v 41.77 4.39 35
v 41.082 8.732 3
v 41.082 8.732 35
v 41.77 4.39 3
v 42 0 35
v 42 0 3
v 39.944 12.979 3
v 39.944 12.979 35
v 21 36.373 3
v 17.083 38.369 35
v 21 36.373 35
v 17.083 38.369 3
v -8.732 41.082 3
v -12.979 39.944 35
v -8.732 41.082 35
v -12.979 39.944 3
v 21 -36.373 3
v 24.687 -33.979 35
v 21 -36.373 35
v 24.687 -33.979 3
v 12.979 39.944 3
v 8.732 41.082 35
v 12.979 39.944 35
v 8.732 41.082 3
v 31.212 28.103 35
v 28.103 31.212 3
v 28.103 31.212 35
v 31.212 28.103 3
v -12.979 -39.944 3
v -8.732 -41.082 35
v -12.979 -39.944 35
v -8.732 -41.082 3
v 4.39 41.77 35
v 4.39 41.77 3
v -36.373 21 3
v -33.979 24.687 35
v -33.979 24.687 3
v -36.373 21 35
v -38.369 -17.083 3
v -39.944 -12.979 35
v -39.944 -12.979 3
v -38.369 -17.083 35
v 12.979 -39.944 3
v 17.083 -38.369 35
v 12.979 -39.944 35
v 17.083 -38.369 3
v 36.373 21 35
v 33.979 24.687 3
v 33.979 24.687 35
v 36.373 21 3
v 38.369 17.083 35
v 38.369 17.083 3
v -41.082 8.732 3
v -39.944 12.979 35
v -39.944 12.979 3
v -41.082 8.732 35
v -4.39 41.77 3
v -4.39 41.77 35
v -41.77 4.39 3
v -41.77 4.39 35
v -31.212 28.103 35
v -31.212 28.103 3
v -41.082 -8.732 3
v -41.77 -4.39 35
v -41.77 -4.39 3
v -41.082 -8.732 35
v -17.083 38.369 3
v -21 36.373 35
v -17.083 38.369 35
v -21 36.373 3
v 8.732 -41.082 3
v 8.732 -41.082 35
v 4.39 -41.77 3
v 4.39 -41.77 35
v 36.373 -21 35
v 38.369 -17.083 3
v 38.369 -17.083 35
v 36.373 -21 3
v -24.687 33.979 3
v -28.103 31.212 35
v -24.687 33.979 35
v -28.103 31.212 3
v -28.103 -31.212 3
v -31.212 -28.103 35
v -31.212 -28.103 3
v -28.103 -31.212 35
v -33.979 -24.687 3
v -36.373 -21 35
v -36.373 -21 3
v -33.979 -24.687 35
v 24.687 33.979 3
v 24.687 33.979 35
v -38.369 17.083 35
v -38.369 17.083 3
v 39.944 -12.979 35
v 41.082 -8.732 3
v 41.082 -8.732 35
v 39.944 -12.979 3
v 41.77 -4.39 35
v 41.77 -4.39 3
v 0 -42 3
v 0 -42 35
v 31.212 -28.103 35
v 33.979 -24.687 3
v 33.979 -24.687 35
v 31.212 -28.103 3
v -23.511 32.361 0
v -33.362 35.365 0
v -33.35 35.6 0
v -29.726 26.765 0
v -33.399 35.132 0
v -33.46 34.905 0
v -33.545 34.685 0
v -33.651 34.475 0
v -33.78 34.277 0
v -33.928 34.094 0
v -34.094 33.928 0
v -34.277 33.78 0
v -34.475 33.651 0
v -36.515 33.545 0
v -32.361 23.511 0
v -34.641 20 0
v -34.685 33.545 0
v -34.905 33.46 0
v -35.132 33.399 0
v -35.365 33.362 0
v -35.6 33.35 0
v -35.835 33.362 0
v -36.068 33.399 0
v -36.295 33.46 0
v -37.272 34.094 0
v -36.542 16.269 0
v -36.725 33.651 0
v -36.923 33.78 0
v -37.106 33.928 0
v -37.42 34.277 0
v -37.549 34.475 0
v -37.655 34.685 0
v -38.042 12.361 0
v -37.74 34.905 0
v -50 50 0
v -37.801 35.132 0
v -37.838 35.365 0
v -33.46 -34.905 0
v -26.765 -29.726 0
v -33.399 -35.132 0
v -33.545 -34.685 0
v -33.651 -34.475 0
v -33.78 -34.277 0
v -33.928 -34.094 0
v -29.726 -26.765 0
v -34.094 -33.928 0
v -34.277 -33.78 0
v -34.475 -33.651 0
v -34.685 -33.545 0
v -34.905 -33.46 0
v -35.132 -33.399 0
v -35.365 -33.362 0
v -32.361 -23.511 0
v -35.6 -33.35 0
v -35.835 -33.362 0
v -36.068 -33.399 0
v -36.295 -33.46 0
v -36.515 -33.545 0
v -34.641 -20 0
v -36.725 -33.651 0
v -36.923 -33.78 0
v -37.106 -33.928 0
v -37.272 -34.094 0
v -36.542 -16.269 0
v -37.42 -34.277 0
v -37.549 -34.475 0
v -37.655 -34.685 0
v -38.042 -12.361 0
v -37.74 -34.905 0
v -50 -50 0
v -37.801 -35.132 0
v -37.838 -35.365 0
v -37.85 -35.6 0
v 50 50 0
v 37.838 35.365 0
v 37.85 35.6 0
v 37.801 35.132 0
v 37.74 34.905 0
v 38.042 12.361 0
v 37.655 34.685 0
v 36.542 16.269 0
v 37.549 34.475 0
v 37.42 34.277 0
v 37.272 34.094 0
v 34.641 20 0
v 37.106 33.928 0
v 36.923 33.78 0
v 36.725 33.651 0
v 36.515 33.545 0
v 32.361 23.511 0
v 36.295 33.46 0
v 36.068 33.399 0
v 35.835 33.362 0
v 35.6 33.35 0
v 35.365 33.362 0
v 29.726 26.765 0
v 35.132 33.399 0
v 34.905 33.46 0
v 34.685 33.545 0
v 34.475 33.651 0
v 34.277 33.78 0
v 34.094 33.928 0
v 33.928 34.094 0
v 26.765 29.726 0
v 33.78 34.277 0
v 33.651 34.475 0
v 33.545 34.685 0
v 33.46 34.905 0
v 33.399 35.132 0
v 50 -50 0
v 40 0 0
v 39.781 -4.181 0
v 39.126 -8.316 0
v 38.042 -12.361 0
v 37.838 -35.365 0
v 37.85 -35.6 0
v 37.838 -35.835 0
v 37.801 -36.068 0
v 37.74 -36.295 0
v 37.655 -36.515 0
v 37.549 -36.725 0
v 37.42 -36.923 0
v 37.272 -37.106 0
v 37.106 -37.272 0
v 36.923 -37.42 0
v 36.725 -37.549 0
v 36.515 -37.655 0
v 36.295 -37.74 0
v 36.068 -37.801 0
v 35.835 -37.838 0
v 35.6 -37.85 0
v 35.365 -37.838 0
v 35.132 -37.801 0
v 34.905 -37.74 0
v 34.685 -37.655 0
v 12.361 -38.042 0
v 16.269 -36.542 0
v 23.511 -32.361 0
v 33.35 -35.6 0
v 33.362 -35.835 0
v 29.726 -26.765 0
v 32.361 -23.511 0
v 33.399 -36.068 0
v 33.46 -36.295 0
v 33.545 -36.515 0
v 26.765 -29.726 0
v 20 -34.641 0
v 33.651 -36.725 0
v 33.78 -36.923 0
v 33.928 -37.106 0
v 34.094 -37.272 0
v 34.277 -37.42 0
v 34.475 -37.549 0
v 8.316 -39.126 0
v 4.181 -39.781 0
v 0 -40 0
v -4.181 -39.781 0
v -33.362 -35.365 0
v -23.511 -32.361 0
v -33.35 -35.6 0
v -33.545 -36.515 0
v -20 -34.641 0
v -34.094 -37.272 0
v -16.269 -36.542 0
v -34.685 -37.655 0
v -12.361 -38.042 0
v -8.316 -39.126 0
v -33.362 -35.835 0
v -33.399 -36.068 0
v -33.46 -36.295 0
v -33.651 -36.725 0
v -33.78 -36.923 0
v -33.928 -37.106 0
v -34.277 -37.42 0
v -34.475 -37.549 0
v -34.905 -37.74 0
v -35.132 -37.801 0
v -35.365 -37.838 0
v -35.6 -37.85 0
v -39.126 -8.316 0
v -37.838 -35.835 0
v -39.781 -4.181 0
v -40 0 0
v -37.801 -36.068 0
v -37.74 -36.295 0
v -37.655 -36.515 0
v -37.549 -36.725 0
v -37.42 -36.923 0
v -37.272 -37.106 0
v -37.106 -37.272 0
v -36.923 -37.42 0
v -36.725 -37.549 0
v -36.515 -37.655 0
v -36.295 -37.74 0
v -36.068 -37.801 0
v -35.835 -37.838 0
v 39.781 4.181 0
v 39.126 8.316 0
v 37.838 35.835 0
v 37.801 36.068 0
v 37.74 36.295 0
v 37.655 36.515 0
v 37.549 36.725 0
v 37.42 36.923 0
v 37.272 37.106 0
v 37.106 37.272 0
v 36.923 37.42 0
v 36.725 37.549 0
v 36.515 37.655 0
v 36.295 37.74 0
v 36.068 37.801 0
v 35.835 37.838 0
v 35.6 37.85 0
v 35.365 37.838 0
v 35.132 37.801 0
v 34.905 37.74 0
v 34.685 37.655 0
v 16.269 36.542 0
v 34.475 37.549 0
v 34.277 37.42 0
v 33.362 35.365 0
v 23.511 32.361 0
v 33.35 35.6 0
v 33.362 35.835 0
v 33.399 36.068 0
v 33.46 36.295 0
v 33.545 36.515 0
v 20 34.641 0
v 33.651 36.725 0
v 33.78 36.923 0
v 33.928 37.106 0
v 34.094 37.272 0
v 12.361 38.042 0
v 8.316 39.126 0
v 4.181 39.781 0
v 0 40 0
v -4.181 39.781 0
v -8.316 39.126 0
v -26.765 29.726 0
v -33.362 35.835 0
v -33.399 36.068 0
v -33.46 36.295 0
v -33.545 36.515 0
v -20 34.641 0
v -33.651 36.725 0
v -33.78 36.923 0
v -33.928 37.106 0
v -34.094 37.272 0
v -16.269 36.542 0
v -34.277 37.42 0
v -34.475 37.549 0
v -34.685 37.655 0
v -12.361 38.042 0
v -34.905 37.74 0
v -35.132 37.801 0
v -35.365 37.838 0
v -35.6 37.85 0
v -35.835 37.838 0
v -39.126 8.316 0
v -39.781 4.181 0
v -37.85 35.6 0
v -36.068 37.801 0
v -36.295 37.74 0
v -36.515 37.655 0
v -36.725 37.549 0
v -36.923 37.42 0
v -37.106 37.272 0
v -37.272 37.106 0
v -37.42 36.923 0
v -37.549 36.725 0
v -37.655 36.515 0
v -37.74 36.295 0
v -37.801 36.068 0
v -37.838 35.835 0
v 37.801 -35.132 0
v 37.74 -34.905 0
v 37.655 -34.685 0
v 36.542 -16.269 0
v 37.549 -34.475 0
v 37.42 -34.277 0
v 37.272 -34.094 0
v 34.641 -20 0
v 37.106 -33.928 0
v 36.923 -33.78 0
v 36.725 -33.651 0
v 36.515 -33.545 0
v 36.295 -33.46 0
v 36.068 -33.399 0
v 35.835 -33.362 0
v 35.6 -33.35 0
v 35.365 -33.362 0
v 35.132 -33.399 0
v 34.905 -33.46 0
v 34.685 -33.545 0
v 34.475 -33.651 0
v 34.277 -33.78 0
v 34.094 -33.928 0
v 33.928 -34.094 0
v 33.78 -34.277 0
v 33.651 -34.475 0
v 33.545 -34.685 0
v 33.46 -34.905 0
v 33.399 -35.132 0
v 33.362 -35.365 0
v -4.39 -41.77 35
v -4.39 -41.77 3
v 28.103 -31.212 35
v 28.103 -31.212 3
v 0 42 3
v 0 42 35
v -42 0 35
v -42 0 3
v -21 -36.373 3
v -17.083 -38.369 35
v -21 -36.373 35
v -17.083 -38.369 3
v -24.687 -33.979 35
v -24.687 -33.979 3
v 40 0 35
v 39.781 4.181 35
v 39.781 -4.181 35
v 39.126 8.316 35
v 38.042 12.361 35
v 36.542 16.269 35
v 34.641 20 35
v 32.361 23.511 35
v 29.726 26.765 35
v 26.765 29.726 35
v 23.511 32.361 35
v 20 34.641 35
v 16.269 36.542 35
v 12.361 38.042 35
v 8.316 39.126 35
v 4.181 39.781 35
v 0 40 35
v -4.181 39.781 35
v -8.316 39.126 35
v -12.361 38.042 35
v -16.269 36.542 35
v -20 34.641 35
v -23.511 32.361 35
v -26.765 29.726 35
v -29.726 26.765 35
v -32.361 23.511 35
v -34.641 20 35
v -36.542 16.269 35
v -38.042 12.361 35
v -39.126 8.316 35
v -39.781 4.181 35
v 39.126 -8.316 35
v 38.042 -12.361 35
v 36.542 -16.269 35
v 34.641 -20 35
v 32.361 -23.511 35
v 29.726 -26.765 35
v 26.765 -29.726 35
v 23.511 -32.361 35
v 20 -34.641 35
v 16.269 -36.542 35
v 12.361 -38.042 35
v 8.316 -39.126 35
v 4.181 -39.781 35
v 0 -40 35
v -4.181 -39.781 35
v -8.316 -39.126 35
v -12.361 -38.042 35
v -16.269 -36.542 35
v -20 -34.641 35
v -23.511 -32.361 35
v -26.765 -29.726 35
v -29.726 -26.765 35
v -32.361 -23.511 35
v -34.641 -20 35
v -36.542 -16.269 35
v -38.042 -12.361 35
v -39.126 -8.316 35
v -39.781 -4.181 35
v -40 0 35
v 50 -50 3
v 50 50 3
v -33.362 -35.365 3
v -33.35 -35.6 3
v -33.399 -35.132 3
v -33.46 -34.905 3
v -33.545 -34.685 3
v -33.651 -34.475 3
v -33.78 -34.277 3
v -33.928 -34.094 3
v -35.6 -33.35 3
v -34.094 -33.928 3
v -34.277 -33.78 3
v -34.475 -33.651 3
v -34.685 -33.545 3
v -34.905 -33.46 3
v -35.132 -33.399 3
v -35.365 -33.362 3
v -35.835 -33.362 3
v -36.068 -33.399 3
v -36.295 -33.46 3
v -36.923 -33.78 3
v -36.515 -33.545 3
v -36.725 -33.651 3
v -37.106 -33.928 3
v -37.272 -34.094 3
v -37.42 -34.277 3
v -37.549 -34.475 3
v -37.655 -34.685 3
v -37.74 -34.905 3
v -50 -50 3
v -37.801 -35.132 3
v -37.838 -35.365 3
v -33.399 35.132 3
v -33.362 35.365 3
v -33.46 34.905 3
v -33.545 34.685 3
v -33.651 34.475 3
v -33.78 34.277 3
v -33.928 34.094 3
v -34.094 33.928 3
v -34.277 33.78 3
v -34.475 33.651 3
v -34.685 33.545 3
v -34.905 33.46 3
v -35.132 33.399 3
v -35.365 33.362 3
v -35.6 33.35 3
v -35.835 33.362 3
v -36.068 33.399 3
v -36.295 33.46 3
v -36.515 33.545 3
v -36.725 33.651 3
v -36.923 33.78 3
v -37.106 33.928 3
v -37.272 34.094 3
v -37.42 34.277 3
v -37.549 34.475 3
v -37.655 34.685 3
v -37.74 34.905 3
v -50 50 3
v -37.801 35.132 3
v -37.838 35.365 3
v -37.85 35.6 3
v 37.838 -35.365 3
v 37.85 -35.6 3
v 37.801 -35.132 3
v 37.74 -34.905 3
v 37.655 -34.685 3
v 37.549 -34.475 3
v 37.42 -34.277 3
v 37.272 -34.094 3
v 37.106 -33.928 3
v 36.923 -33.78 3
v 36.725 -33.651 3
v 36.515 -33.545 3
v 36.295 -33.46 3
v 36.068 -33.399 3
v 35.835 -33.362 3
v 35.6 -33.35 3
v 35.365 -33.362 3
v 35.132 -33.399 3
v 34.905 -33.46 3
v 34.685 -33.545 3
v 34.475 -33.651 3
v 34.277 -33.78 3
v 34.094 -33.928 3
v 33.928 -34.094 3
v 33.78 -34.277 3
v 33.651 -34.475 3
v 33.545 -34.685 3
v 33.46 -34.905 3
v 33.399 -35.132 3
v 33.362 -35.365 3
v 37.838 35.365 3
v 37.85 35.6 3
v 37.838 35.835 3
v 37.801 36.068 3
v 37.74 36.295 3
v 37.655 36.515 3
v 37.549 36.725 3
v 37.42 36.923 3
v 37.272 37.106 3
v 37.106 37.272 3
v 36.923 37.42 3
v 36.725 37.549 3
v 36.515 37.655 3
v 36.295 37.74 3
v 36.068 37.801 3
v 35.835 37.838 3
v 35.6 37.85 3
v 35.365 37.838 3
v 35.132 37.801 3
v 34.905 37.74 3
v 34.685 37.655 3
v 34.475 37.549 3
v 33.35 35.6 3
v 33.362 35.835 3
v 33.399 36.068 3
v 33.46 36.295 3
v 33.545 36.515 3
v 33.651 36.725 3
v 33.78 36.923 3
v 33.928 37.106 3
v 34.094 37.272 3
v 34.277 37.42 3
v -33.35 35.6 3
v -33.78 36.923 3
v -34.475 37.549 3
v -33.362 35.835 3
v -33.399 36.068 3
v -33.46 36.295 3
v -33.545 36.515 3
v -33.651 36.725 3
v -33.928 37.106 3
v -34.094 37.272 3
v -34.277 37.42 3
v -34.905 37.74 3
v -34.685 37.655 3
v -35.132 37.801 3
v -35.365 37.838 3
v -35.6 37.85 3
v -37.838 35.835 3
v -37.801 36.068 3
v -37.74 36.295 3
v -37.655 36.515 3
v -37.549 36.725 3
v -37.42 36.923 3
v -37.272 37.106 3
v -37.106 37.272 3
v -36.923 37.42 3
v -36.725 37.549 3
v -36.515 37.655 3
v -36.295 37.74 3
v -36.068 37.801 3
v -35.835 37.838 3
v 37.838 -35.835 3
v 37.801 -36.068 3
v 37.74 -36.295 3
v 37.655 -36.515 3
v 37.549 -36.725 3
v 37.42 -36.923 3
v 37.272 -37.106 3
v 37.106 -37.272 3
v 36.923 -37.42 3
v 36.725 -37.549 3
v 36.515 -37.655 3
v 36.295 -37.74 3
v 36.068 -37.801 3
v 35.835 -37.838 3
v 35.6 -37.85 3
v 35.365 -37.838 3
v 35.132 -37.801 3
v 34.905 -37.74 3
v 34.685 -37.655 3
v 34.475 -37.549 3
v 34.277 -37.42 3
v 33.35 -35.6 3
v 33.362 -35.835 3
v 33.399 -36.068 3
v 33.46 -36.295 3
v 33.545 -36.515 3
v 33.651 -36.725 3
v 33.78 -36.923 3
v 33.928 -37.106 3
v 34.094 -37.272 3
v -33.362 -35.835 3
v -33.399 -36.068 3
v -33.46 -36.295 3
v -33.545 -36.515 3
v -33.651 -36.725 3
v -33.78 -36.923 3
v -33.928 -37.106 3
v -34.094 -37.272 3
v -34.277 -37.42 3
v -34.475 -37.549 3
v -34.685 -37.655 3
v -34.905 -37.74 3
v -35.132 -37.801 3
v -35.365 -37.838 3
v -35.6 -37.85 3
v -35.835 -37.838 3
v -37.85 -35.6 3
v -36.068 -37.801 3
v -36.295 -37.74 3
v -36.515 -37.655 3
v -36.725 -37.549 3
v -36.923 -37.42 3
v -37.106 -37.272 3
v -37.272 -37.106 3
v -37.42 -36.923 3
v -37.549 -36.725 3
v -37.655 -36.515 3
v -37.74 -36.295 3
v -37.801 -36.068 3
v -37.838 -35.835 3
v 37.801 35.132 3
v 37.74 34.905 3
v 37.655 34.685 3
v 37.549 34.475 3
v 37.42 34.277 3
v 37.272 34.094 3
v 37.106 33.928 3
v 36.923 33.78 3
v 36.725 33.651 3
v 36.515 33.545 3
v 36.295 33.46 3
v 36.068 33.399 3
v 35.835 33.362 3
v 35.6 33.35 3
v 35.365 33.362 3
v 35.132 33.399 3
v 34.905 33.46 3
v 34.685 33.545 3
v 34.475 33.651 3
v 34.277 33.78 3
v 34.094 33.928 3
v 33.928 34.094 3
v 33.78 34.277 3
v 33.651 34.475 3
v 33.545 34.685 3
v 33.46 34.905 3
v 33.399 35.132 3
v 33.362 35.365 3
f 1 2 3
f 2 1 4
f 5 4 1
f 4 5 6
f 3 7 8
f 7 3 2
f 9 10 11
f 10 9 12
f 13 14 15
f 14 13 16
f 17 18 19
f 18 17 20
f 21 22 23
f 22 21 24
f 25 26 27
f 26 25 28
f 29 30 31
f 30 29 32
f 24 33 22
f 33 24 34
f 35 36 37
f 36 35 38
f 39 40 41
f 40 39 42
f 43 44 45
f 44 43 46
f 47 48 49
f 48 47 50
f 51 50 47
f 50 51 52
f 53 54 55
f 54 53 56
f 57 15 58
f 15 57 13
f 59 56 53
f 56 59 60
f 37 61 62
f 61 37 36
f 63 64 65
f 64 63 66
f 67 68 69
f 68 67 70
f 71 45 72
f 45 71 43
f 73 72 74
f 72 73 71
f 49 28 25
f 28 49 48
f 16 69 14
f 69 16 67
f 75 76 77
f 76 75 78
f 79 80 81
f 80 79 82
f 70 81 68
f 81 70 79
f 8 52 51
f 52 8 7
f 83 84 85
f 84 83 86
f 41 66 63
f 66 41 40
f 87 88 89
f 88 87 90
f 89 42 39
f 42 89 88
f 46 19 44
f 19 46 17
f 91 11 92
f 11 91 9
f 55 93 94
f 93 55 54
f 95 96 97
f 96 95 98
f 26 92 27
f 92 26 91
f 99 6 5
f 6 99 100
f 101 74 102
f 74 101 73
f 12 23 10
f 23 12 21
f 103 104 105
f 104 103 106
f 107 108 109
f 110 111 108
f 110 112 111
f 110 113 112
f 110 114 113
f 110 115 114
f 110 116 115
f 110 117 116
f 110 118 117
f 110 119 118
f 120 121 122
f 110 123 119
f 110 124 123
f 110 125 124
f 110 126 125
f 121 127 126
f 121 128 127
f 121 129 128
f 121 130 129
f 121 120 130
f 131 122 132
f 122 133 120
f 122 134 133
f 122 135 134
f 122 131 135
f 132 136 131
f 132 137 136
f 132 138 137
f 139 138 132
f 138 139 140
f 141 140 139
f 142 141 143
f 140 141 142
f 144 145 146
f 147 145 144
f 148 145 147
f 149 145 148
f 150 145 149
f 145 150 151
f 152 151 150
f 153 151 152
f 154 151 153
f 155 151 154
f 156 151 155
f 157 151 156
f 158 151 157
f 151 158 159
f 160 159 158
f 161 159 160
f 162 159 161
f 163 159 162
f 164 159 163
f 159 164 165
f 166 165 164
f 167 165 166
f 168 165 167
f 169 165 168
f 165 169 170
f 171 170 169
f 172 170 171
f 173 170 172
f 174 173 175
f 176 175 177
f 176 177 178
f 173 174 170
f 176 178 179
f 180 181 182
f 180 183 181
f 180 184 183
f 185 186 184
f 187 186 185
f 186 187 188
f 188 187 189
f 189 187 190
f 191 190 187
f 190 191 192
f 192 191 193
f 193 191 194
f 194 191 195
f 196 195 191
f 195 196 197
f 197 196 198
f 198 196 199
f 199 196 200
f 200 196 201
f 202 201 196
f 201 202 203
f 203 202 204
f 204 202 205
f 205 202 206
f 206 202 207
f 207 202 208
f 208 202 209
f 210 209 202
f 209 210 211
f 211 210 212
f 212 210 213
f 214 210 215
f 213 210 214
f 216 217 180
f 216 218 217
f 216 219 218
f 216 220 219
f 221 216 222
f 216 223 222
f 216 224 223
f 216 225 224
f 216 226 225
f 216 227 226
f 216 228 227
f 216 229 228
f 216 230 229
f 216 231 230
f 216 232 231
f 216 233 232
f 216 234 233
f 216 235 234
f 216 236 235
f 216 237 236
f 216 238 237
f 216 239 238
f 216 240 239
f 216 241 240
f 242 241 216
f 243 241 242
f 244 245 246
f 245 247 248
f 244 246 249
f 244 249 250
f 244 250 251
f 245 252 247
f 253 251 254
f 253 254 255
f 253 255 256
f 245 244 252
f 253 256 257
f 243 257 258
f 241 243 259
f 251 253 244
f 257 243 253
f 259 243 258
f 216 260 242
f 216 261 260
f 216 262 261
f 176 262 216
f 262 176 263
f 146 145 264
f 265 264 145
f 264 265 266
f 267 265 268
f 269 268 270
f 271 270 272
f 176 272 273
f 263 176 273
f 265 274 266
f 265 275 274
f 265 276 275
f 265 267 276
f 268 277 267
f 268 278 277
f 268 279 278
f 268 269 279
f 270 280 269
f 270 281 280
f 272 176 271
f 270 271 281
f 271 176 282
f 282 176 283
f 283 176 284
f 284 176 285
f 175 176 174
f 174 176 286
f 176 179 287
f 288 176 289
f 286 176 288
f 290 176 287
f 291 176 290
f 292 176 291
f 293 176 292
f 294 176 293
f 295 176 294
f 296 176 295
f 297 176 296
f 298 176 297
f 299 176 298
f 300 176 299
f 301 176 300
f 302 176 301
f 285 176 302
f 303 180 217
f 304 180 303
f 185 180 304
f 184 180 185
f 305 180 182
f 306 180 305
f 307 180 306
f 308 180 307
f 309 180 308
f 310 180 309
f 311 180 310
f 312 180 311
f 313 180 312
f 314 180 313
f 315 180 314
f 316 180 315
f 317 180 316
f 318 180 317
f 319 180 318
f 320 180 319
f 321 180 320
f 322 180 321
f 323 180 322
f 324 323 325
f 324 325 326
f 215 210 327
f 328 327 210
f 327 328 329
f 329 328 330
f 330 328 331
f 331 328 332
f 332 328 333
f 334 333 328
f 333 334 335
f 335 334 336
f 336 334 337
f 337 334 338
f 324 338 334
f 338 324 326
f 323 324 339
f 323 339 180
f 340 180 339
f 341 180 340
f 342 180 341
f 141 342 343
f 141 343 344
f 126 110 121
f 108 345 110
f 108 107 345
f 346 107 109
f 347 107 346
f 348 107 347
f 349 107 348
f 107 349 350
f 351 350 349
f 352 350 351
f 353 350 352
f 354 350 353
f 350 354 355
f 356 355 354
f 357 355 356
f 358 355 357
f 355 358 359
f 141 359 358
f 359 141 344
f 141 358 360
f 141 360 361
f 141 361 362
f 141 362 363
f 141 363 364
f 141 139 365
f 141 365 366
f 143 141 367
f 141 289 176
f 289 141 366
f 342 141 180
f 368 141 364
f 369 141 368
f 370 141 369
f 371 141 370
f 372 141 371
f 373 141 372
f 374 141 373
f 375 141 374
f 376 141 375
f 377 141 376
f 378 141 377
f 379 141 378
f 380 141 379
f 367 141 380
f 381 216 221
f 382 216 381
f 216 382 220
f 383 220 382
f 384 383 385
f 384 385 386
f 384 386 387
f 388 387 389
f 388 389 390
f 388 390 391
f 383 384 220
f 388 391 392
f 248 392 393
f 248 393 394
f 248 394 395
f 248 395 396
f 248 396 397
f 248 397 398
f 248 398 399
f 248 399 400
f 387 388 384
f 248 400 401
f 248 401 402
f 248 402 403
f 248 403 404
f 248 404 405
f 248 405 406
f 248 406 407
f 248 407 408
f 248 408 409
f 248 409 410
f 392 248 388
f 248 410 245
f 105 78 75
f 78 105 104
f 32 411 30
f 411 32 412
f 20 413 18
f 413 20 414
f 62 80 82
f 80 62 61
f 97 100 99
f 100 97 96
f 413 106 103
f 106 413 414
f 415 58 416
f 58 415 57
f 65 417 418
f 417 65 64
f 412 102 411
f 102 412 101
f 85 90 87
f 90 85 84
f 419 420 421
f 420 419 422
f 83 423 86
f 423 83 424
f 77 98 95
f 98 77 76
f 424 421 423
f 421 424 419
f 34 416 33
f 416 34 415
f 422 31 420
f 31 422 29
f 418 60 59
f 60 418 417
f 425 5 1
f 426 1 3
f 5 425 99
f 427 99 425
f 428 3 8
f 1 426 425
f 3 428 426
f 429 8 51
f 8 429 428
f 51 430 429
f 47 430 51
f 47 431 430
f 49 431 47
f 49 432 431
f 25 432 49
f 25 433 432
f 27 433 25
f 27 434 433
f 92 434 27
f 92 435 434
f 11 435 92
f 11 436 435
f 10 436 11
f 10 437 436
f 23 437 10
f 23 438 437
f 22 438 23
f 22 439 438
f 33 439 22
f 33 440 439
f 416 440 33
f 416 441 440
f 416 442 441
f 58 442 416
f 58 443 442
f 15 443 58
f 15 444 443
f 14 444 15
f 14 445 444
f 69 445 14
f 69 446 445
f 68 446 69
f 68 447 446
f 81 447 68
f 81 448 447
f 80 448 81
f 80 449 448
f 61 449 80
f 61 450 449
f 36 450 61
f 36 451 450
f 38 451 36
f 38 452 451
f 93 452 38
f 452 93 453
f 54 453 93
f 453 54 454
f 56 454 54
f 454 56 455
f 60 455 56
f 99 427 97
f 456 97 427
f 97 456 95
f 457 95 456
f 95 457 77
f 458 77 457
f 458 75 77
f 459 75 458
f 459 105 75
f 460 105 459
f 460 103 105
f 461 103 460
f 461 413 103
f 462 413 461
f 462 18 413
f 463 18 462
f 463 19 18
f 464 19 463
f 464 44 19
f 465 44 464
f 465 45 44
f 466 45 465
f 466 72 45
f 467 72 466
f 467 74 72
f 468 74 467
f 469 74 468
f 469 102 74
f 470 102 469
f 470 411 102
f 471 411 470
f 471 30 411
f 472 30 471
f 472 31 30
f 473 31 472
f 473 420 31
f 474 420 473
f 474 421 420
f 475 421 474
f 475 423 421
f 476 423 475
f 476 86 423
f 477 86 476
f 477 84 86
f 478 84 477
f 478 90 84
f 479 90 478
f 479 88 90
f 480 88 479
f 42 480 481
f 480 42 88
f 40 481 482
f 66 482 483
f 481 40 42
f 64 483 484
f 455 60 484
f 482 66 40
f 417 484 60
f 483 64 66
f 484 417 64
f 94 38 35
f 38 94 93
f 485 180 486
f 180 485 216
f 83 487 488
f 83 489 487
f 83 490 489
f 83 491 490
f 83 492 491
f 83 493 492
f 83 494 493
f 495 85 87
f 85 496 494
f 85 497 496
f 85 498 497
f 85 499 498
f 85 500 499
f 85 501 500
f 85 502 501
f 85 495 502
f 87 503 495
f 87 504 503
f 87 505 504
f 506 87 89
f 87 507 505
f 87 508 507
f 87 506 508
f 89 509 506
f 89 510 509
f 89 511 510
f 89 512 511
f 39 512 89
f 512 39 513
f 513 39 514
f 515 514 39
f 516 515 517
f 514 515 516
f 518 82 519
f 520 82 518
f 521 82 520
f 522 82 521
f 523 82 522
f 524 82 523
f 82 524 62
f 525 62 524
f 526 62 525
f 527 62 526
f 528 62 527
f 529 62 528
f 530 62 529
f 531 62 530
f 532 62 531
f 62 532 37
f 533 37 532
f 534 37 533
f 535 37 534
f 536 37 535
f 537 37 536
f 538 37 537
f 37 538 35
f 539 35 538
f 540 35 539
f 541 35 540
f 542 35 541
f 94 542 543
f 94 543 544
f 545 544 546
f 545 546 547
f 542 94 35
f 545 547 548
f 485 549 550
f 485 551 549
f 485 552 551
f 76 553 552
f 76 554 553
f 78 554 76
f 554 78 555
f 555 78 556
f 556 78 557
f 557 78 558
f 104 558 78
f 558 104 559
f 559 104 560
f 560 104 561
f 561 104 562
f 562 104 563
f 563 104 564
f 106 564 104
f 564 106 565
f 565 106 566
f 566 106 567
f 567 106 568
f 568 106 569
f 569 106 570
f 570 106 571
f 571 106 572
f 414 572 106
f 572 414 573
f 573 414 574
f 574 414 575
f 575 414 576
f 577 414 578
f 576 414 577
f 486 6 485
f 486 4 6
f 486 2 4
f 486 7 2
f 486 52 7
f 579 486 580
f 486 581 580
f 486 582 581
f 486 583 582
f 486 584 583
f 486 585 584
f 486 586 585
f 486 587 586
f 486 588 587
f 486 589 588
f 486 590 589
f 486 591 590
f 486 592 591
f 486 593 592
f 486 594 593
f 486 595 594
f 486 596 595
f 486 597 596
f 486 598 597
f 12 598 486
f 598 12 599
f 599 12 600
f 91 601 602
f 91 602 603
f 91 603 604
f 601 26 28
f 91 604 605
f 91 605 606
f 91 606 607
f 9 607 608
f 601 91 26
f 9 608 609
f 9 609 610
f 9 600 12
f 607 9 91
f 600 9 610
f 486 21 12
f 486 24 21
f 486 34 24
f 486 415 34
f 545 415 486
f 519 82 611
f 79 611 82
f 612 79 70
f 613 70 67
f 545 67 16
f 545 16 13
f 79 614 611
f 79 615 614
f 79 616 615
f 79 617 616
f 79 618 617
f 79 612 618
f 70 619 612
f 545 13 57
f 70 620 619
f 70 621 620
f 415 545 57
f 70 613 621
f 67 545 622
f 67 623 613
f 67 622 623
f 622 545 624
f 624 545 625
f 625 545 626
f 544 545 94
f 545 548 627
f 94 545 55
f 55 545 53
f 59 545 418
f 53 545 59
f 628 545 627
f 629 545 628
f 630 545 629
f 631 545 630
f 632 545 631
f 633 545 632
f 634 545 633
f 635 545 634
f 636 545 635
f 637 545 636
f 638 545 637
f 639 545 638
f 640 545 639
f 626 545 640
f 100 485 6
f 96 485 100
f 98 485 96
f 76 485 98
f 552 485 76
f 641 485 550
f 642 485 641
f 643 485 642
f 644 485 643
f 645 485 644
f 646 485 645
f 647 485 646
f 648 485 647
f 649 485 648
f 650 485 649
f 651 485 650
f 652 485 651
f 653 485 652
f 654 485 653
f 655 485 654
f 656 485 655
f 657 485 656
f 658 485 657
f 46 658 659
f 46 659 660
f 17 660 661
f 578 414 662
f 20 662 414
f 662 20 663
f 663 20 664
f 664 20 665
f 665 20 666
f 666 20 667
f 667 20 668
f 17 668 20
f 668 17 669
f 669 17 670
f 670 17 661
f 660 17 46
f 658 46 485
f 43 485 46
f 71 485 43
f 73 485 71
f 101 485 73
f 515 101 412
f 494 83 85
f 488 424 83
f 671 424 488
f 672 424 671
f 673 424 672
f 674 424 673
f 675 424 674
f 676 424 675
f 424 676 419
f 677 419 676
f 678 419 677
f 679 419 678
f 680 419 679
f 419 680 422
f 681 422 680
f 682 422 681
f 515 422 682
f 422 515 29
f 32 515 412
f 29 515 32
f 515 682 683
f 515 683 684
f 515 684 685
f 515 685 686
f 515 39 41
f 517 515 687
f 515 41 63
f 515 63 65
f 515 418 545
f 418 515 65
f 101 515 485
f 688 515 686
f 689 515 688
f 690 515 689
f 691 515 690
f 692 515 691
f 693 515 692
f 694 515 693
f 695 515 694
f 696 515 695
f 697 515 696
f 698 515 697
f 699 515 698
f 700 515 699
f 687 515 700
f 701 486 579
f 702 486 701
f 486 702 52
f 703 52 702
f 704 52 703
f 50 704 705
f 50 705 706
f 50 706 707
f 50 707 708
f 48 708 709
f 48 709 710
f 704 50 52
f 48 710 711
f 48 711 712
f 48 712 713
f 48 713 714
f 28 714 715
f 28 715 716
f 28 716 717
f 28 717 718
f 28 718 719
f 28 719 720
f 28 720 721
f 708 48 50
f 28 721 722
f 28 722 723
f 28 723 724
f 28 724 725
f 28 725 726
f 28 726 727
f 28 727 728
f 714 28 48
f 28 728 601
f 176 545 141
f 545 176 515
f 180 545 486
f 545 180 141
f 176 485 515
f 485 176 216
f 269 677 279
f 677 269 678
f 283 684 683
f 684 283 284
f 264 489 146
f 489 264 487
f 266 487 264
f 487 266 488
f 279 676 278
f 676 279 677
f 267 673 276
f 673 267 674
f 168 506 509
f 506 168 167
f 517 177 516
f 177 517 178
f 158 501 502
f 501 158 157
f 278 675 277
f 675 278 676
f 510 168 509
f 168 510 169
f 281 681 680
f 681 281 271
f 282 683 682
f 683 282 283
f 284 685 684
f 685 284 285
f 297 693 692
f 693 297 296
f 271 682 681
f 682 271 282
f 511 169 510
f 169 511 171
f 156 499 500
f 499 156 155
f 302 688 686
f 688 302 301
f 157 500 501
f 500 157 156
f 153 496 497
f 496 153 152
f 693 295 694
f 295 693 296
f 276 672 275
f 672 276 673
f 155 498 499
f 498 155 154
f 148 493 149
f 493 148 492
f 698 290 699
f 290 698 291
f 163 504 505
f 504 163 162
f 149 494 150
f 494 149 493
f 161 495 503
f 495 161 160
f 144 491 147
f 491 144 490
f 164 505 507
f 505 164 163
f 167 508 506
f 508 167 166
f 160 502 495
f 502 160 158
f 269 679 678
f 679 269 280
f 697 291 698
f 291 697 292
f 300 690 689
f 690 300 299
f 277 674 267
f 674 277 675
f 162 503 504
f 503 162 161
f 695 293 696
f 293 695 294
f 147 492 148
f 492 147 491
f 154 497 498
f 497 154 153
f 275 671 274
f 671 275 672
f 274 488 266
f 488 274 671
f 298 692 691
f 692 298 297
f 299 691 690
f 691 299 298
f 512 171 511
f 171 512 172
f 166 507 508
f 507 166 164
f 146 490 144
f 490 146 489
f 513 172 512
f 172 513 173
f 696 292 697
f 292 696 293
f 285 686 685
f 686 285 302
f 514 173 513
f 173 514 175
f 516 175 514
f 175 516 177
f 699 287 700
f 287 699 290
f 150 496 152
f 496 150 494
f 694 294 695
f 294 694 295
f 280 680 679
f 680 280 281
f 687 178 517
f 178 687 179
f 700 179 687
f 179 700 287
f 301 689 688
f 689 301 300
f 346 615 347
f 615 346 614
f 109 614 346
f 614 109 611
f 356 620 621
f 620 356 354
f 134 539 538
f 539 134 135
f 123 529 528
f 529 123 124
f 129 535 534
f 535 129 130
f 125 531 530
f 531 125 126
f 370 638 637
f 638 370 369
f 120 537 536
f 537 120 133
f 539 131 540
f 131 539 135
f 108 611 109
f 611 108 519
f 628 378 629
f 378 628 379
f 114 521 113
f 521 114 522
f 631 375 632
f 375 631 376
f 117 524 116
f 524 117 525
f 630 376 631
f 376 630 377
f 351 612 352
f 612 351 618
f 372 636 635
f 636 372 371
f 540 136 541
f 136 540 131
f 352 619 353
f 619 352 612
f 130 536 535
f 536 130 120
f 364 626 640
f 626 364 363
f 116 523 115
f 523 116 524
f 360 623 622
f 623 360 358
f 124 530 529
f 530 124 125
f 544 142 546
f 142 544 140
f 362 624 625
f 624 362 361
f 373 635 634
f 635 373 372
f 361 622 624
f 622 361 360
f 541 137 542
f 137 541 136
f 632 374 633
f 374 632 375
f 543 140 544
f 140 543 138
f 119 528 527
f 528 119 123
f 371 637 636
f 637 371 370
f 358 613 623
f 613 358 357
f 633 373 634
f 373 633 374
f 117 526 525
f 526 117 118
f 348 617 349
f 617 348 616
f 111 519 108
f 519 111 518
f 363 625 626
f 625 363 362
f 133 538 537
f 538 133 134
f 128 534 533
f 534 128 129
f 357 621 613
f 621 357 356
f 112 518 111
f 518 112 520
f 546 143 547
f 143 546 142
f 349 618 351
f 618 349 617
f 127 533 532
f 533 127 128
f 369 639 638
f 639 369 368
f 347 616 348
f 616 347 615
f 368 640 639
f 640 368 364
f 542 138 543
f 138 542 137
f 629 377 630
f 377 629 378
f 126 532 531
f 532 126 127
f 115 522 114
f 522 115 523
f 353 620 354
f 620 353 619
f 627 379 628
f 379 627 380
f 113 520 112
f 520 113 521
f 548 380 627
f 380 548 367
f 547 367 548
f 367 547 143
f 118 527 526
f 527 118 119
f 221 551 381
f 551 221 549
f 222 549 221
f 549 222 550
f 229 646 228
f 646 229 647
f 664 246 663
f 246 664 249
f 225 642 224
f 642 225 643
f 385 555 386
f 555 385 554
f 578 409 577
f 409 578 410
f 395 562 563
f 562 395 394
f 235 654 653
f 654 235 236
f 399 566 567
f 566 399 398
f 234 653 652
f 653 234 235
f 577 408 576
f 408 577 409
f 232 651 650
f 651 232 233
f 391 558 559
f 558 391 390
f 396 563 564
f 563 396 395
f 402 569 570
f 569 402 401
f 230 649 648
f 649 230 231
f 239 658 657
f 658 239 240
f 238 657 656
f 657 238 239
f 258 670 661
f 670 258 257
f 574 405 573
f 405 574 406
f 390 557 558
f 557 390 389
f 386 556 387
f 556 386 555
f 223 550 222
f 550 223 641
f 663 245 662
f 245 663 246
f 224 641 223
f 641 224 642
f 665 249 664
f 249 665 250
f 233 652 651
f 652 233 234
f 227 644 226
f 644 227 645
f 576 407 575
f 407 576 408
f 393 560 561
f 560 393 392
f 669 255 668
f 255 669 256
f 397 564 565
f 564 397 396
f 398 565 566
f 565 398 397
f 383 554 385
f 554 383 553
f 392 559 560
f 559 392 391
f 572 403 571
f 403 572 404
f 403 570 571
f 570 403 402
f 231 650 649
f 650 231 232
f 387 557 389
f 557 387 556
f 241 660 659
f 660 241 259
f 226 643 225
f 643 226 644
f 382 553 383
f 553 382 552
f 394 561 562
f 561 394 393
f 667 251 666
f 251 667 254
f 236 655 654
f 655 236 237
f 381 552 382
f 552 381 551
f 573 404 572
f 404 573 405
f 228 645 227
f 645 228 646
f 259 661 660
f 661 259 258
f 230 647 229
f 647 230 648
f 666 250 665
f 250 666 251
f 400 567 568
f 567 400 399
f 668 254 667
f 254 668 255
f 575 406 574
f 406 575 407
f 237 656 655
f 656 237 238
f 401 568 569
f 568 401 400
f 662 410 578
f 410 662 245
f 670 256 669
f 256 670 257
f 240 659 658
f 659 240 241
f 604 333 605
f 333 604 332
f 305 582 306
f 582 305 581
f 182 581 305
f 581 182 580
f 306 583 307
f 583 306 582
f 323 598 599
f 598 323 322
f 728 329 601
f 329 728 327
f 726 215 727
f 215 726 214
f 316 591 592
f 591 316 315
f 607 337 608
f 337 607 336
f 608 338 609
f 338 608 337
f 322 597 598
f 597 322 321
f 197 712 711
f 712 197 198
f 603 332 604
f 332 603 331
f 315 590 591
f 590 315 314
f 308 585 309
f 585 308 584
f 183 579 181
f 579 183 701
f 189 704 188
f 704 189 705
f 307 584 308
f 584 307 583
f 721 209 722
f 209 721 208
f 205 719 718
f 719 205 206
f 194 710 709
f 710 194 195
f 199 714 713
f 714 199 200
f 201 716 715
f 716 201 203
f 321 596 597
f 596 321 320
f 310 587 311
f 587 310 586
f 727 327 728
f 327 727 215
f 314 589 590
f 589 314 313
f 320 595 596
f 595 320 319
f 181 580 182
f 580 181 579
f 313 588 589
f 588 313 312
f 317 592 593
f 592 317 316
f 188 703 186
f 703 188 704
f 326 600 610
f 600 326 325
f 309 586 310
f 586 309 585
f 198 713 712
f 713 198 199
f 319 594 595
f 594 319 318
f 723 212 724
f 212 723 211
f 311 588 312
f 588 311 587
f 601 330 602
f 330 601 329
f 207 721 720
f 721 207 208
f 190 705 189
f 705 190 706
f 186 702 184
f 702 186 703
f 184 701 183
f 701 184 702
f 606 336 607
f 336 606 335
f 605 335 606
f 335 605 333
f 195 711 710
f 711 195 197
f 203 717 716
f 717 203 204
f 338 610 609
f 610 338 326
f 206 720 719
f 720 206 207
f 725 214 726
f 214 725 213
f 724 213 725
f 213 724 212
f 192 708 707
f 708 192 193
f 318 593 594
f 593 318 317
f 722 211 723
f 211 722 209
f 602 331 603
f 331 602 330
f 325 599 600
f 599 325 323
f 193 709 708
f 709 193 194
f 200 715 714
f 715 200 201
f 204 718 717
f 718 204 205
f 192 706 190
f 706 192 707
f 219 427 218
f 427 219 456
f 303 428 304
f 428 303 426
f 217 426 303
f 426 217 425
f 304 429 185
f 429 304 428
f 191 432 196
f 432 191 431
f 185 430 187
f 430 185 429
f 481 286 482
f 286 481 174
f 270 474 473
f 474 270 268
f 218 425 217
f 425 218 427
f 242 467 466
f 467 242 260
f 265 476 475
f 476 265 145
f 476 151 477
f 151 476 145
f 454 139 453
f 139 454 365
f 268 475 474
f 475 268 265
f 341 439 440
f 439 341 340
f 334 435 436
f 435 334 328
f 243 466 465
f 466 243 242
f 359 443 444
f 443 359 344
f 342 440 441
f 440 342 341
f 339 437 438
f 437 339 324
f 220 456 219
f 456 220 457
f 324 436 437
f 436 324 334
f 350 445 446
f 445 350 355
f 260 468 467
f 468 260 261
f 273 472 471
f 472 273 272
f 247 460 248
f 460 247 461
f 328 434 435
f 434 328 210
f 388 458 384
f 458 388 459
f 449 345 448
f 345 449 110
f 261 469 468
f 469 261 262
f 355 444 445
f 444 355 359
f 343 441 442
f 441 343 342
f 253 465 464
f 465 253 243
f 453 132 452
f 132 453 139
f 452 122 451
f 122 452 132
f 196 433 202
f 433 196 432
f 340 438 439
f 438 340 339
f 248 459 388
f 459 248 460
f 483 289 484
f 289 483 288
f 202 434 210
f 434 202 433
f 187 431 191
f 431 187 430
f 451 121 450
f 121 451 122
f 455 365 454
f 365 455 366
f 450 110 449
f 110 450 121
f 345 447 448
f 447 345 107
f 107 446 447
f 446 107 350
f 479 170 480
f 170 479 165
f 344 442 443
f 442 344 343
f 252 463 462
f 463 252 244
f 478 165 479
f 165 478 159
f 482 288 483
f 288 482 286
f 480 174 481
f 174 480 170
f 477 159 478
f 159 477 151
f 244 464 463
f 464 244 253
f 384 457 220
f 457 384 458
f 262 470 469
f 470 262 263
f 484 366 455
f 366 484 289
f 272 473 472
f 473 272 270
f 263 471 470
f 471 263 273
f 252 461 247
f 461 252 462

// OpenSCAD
$fn=60;

// hose_radius = 84/2;
// hose_depth = 25;
// thickness = 3;

// flange_width = 120;
// flange_length = 120;
// flange_depth = 3;

// flange_offset_x = 15;
// flange_offset_y = 15;

// fan_mount_hole_distance=67;
// fan_mount_hole_diameter = 4.5;

// flange_hole_diameter = 4.5;


hose_radius = 84/2;
hose_depth = 35;
thickness = 2;

flange_width = 100;
flange_length = 100;
flange_depth = 3;

flange_offset_x = 0;
flange_offset_y = 0;


fan_holes = 0;
fan_mount_hole_distance=71.2 / 2;
fan_mount_hole_diameter = 4.5;

flange_hole_diameter = 4.5;
flange_hole_distance = (flange_width - 20) /2;

flange(1, 0, 0, flange_width, flange_length, flange_depth, hose_radius, hose_depth);

//translate([120,0,0])
//translate([120,0,0])
//flange(0, 1, 1, flange_width + 15, flange_length + 15, flange_depth +1, hose_radius, 25.4/2, hose_radius-thickness -.5, hose_depth+25);

//color("blue")
//translate([120,100,0])
//insert(hose_radius, hose_depth+25);

module insert(hose_radius, hose_depth)
{
	difference()
	{
		cylinder(r=hose_radius, h=hose_depth);
		translate([0,0,-1])
			cylinder(r=hose_radius-thickness, h=hose_depth+2);
	}
}

module lines(gw)
{
	for(i = [-flange_length / gw / 2:(flange_length / gw / 2)])
	{
		translate([-flange_width/2,	i * gw,0])
			cube([flange_width,gw /3,2]);
	}
}


module flange(fan_holes, mount_holes, grid, flange_width, flange_length, flange_depth, hose_radius, hose_depth, hose_radius2, hose_depth2)
{
	gw = 6;
	if (grid == 1)
	{
		difference()
		{
			union()
			{
				rotate([0,0,90])lines(gw);
				lines(gw);
			}
			if (mount_holes == 1)
			{
				translate([-flange_hole_distance, -flange_hole_distance, -1])
					flange_mount();
				translate([-flange_hole_distance, flange_hole_distance, -1])
					flange_mount();
				translate([flange_hole_distance, -flange_hole_distance, -1])
					flange_mount();
				translate([flange_hole_distance, flange_hole_distance, -1])
					flange_mount();		
			}
		}
	}
	
	difference()
	{
		union()
		{
			cylinder(r=hose_radius, h=hose_depth);
			cylinder(r=hose_radius2, h=hose_depth2);
			translate([flange_offset_x, flange_offset_y, 0])
				translate([-flange_width/2, -flange_length/2, 0])
					cube([flange_width, flange_length, flange_depth]);

			

		}
		
		translate([0,0,-1])
		{
			if (hose_radius2 > 0)
				cylinder(r=hose_radius2-thickness, h=hose_depth2+2);
			else
				cylinder(r=hose_radius-thickness, h=hose_depth+2);

		}
		
		if (fan_holes == 1)
		{
			translate([-fan_mount_hole_distance, -fan_mount_hole_distance, -1])
				fan_mount();
			translate([-fan_mount_hole_distance, fan_mount_hole_distance, -1])
				fan_mount();
			translate([fan_mount_hole_distance, -fan_mount_hole_distance, -1])
				fan_mount();
			translate([fan_mount_hole_distance, fan_mount_hole_distance, -1])
				fan_mount();
		}
		
		if (mount_holes == 1)
		{
			translate([-flange_hole_distance, -flange_hole_distance, -1])
				flange_mount();
			translate([-flange_hole_distance, flange_hole_distance, -1])
				flange_mount();
			translate([flange_hole_distance, -flange_hole_distance, -1])
				flange_mount();
			translate([flange_hole_distance, flange_hole_distance, -1])
				flange_mount();		
		}
	}
}

module flange_mount()
{
	
	cylinder(r=fan_mount_hole_diameter/2, h=flange_depth + 2);
}
module fan_mount()
{
	//translate([0,0,1])cylinder(r=6.2, h=4, $fn=6);
	cylinder(r=fan_mount_hole_diameter/2, h=flange_depth + 2);
}
